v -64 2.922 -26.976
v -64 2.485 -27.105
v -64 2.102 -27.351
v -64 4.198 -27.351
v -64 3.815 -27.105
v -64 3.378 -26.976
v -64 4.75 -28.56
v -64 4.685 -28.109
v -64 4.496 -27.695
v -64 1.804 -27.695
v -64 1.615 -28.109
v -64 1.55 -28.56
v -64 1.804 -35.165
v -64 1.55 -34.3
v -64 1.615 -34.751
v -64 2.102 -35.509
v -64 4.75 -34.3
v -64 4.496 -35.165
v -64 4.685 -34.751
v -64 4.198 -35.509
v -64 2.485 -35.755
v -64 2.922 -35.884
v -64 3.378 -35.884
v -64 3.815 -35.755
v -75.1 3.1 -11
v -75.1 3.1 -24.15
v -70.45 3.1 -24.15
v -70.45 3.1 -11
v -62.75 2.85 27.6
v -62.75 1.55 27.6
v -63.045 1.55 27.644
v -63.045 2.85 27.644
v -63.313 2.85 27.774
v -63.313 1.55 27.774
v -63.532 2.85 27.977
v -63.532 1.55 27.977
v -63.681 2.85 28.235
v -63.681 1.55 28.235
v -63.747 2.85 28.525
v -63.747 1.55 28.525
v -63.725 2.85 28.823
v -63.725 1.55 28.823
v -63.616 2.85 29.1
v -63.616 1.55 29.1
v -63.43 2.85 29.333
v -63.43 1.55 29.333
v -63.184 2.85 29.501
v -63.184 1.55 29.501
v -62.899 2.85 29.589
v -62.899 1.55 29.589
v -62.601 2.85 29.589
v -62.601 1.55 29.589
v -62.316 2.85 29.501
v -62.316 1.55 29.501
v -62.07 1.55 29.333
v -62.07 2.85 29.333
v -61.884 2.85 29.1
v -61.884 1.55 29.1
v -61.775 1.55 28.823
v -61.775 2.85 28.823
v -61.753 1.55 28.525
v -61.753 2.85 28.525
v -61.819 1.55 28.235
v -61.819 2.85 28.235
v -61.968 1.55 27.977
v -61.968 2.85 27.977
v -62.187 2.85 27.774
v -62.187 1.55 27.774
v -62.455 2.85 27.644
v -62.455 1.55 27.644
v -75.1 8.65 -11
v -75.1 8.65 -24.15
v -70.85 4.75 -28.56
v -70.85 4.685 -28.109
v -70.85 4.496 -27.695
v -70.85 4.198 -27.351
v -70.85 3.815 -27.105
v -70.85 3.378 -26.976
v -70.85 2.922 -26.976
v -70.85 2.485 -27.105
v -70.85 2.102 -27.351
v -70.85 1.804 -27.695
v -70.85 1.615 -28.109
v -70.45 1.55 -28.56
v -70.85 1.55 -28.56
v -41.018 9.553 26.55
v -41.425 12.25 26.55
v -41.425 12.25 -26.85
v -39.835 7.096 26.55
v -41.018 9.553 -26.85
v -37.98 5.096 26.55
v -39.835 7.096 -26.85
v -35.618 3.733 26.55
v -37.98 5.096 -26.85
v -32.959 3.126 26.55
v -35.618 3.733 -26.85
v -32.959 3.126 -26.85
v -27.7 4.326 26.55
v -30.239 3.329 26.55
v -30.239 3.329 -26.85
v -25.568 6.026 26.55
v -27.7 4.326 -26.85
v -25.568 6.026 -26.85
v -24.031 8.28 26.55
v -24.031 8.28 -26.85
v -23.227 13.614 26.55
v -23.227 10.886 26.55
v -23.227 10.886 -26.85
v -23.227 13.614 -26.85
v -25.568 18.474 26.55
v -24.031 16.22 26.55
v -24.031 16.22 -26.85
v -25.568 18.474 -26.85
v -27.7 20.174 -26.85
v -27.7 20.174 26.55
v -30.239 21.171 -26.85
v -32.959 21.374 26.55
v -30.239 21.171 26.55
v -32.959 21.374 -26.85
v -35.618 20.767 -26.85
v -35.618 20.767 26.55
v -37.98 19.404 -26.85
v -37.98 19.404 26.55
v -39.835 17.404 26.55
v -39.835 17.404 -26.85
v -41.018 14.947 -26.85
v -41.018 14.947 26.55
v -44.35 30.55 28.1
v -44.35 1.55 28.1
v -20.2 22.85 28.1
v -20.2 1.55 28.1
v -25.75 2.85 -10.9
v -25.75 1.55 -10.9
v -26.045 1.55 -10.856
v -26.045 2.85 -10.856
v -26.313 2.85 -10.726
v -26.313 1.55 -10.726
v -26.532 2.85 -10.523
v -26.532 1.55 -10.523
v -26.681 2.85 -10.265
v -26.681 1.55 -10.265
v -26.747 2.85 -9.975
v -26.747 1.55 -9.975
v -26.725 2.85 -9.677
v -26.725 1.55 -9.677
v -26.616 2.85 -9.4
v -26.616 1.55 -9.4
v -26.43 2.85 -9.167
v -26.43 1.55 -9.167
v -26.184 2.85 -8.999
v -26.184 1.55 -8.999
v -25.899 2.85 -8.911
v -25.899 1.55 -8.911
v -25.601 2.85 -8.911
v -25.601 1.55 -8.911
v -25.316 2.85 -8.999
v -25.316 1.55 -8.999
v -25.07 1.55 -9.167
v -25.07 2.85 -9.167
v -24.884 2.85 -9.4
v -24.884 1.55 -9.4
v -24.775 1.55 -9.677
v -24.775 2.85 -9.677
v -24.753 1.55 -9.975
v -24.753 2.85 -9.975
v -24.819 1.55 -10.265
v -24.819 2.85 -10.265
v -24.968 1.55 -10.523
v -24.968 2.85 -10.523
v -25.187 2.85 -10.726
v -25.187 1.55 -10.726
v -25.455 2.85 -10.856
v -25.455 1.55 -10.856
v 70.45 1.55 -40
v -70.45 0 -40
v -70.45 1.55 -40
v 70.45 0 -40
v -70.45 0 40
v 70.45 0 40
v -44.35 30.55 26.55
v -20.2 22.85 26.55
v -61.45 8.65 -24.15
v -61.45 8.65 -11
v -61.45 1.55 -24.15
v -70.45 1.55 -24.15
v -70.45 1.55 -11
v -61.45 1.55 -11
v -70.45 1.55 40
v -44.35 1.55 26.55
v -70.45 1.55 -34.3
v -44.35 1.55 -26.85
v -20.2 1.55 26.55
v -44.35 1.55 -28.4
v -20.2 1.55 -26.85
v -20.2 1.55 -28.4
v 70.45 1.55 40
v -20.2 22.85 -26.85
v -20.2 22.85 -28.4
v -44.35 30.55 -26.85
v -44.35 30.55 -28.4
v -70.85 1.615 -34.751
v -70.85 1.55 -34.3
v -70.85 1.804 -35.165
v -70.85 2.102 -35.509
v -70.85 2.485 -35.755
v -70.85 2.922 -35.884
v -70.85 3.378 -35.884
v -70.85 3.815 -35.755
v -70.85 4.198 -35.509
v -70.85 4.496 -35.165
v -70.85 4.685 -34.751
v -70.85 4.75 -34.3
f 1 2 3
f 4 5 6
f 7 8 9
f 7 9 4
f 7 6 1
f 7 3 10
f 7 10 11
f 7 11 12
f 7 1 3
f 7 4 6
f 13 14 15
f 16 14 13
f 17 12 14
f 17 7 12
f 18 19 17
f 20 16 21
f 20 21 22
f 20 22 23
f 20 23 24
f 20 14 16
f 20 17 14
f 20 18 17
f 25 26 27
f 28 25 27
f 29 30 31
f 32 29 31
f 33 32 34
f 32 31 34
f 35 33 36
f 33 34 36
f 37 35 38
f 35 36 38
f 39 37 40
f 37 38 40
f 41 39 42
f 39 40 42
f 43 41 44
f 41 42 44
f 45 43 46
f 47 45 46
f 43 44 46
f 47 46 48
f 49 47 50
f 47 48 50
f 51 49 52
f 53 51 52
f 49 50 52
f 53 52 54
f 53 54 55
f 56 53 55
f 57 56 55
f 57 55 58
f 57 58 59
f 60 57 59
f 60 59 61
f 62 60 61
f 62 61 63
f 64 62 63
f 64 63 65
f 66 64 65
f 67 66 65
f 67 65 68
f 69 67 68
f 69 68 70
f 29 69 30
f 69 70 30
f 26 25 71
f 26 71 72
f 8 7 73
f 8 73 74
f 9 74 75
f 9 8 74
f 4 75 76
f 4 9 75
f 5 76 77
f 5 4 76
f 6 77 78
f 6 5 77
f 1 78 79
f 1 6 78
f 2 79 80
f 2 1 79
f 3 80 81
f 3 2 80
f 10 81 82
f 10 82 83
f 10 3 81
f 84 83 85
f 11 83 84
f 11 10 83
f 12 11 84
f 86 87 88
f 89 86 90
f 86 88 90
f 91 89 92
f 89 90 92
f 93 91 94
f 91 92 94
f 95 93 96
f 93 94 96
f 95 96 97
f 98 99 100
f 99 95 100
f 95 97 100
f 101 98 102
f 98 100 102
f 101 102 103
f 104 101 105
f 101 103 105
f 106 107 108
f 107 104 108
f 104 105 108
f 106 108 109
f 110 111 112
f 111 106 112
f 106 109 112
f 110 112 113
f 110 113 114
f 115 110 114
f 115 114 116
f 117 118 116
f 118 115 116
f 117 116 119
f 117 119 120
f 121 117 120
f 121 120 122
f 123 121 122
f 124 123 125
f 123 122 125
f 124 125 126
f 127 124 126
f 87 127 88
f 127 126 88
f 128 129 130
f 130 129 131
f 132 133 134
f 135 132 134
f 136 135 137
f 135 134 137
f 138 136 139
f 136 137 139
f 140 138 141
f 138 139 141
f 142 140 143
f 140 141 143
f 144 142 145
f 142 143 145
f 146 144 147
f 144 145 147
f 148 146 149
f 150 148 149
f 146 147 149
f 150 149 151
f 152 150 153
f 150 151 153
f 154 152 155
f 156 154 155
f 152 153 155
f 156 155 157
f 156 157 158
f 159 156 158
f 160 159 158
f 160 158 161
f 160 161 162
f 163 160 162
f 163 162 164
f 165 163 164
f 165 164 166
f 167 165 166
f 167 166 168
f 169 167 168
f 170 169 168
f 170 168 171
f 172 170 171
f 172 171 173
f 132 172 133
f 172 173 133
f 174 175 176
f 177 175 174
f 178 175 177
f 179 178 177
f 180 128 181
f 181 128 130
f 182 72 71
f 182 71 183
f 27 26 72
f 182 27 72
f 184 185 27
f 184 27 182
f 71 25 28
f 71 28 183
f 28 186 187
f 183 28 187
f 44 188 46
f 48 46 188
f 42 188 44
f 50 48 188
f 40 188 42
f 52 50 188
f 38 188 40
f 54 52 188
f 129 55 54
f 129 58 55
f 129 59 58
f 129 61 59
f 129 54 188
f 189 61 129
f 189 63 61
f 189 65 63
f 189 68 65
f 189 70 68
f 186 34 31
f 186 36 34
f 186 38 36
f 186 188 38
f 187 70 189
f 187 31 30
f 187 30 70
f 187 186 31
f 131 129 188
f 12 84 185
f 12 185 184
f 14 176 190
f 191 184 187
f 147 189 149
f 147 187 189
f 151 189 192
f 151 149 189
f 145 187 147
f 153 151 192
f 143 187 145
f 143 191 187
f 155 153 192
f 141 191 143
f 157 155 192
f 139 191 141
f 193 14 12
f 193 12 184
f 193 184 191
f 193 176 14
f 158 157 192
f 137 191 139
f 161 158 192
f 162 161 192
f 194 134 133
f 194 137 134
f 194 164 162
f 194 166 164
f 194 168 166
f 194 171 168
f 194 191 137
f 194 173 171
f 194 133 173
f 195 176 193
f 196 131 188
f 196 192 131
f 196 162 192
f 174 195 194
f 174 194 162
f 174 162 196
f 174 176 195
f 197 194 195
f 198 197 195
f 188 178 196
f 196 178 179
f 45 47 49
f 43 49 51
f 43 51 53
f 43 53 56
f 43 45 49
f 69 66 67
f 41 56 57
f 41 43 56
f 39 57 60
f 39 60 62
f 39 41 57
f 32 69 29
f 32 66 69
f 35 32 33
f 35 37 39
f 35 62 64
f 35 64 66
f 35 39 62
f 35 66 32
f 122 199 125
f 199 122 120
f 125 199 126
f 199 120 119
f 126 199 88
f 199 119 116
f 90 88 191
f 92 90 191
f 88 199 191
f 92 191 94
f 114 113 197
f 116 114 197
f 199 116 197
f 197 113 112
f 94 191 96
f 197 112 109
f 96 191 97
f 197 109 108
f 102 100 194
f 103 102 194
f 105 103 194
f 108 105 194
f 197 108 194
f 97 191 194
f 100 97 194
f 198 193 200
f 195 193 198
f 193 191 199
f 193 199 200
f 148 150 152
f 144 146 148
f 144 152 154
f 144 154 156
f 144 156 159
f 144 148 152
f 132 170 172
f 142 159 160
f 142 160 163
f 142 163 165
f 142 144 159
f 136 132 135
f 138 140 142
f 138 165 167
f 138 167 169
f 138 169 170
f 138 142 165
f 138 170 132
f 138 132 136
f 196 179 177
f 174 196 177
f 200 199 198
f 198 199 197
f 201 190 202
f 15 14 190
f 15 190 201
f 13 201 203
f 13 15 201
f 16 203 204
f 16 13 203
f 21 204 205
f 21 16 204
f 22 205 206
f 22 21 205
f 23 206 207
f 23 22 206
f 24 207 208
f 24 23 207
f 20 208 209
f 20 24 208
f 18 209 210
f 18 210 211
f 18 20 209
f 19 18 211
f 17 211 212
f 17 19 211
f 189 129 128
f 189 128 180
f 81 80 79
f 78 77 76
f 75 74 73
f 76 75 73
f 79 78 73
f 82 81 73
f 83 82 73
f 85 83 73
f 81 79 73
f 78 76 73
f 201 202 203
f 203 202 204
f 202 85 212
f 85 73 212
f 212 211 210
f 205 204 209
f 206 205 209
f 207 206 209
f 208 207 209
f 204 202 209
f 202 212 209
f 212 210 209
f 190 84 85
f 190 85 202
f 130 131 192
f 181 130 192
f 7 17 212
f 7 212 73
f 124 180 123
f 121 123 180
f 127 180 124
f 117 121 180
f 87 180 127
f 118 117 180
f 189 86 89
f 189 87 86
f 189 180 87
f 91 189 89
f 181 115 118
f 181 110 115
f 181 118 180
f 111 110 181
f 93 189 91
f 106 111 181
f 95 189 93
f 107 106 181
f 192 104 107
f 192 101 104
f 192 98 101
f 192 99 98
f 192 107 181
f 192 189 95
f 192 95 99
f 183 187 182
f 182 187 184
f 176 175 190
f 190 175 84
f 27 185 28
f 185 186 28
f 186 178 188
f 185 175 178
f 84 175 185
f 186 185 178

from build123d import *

# Parameters (mm, degrees)
SKETCH1_W                = 140.9
SKETCH1_H                = 80
PCB_DEPTH                = 1.55
BODYC_DEPTH              = 0.4
BODYC_DEPTH_BACK         = 6.45
BOSS_EXTRUDE4_DEPTH      = 7.1
BOSS_EXTRUDE4_DEPTH_BACK = 1.55
SKETCH4_W                = 13.65
SKETCH4_H                = 13.15
SKETCH5_W                = 4.65
SKETCH5_H                = 3.1
CUT_EXTRUDE3_DEPTH       = 14.1
SKETCH11_W               = 24.15
SKETCH11_H               = 1.55
BOSS_EXTRUDE8_DEPTH      = 29
SKETCH7_W                = 24.15
SKETCH7_H                = 1.55
BOSS_EXTRUDE5_DEPTH      = 29
CUT_EXTRUDE4_DEPTH       = 89
SKETCH12_R               = 9.15
BATTERY_DEPTH            = 54
SKETCH13_R               = 1
BUTTON_DEPTH             = 1.3
SKETCH14_R               = 1
RESET_DEPTH              = 1.3


with BuildPart() as part:
    # Sketch1 → PCB (new body)
    with BuildSketch(Plane(origin=(0, 0, 0), x_dir=(1, 0, 0), z_dir=(0, 1, 0))):
        Rectangle(SKETCH1_W, SKETCH1_H)
    extrude(amount=PCB_DEPTH)

    # Sketch3 → bodyC (add, two sides: drawn at the far end of the back side and taken through both)
    with BuildSketch(Plane.ZY.offset(70.45).offset(-BODYC_DEPTH_BACK)):
        with BuildLine():
            Line((-34.3, 4.75), (-28.56, 4.75))
            ThreePointArc((-28.56, 4.75), (-26.96, 3.15), (-28.56, 1.55))
            Line((-28.56, 1.55), (-34.3, 1.55))
            ThreePointArc((-34.3, 1.55), (-35.9, 3.15), (-34.3, 4.75))
        make_face()
    extrude(amount=BODYC_DEPTH + BODYC_DEPTH_BACK)

    # Sketch4 → Boss-Extrude4 (add, two sides: drawn at the far end of the back side and taken through both)
    with BuildSketch(Plane(origin=(0, 1.55, 0), x_dir=(1, 0, 0), z_dir=(0, 1, 0)).offset(-BOSS_EXTRUDE4_DEPTH_BACK)):
        with Locations((-68.275, 17.575)):
            Rectangle(SKETCH4_W, SKETCH4_H)
    extrude(amount=BOSS_EXTRUDE4_DEPTH + BOSS_EXTRUDE4_DEPTH_BACK)

    # Sketch5 → Cut-Extrude3 (cut)
    with BuildSketch(Plane.XY.offset(-11)):
        with Locations((-72.775, 1.55)):
            Rectangle(SKETCH5_W, SKETCH5_H)
    extrude(amount=-CUT_EXTRUDE3_DEPTH, mode=Mode.SUBTRACT)

    # Sketch11 → Boss-Extrude8 (add)
    with BuildSketch(Plane(origin=(0, 1.55, 0), x_dir=(1, 0, 0), z_dir=(0, 1, 0))):
        with Locations((-32.275, 27.625)):
            Rectangle(SKETCH11_W, SKETCH11_H)
    extrude(amount=BOSS_EXTRUDE8_DEPTH)

    # Sketch7 → Boss-Extrude5 (add)
    with BuildSketch(Plane(origin=(0, 1.55, 0), x_dir=(1, 0, 0), z_dir=(0, 1, 0))):
        with Locations((-32.275, -27.325)):
            Rectangle(SKETCH7_W, SKETCH7_H)
    extrude(amount=BOSS_EXTRUDE5_DEPTH)

    # Sketch8 → Cut-Extrude4 (cut)
    with BuildSketch(Plane.XY.offset(28.1)):
        Polygon((-44.35, 30.55), (-20.2, 22.85), (-20.2, 30.55), align=None)
    extrude(amount=-CUT_EXTRUDE4_DEPTH, mode=Mode.SUBTRACT)

    # Sketch12 → Battery (add)
    with BuildSketch(Plane.XY.offset(-26.85)):
        with Locations(Location((-32.275, 12.25, 0), (0, 0, 180))):
            Circle(SKETCH12_R)
    extrude(amount=BATTERY_DEPTH)

    # Sketch13 → Button (add)
    with BuildSketch(Plane(origin=(0, 1.55, 0), x_dir=(1, 0, 0), z_dir=(0, 1, 0))):
        with Locations(Location((-62.75, -28.6, 0), (0, 0, 90))):
            Circle(SKETCH13_R)
    extrude(amount=BUTTON_DEPTH)

    # Sketch14 → Reset (add)
    with BuildSketch(Plane(origin=(0, 1.55, 0), x_dir=(1, 0, 0), z_dir=(0, 1, 0))):
        with Locations(Location((-25.75, 9.9, 0), (0, 0, 90))):
            Circle(SKETCH14_R)
    extrude(amount=RESET_DEPTH)


solid = part.part
